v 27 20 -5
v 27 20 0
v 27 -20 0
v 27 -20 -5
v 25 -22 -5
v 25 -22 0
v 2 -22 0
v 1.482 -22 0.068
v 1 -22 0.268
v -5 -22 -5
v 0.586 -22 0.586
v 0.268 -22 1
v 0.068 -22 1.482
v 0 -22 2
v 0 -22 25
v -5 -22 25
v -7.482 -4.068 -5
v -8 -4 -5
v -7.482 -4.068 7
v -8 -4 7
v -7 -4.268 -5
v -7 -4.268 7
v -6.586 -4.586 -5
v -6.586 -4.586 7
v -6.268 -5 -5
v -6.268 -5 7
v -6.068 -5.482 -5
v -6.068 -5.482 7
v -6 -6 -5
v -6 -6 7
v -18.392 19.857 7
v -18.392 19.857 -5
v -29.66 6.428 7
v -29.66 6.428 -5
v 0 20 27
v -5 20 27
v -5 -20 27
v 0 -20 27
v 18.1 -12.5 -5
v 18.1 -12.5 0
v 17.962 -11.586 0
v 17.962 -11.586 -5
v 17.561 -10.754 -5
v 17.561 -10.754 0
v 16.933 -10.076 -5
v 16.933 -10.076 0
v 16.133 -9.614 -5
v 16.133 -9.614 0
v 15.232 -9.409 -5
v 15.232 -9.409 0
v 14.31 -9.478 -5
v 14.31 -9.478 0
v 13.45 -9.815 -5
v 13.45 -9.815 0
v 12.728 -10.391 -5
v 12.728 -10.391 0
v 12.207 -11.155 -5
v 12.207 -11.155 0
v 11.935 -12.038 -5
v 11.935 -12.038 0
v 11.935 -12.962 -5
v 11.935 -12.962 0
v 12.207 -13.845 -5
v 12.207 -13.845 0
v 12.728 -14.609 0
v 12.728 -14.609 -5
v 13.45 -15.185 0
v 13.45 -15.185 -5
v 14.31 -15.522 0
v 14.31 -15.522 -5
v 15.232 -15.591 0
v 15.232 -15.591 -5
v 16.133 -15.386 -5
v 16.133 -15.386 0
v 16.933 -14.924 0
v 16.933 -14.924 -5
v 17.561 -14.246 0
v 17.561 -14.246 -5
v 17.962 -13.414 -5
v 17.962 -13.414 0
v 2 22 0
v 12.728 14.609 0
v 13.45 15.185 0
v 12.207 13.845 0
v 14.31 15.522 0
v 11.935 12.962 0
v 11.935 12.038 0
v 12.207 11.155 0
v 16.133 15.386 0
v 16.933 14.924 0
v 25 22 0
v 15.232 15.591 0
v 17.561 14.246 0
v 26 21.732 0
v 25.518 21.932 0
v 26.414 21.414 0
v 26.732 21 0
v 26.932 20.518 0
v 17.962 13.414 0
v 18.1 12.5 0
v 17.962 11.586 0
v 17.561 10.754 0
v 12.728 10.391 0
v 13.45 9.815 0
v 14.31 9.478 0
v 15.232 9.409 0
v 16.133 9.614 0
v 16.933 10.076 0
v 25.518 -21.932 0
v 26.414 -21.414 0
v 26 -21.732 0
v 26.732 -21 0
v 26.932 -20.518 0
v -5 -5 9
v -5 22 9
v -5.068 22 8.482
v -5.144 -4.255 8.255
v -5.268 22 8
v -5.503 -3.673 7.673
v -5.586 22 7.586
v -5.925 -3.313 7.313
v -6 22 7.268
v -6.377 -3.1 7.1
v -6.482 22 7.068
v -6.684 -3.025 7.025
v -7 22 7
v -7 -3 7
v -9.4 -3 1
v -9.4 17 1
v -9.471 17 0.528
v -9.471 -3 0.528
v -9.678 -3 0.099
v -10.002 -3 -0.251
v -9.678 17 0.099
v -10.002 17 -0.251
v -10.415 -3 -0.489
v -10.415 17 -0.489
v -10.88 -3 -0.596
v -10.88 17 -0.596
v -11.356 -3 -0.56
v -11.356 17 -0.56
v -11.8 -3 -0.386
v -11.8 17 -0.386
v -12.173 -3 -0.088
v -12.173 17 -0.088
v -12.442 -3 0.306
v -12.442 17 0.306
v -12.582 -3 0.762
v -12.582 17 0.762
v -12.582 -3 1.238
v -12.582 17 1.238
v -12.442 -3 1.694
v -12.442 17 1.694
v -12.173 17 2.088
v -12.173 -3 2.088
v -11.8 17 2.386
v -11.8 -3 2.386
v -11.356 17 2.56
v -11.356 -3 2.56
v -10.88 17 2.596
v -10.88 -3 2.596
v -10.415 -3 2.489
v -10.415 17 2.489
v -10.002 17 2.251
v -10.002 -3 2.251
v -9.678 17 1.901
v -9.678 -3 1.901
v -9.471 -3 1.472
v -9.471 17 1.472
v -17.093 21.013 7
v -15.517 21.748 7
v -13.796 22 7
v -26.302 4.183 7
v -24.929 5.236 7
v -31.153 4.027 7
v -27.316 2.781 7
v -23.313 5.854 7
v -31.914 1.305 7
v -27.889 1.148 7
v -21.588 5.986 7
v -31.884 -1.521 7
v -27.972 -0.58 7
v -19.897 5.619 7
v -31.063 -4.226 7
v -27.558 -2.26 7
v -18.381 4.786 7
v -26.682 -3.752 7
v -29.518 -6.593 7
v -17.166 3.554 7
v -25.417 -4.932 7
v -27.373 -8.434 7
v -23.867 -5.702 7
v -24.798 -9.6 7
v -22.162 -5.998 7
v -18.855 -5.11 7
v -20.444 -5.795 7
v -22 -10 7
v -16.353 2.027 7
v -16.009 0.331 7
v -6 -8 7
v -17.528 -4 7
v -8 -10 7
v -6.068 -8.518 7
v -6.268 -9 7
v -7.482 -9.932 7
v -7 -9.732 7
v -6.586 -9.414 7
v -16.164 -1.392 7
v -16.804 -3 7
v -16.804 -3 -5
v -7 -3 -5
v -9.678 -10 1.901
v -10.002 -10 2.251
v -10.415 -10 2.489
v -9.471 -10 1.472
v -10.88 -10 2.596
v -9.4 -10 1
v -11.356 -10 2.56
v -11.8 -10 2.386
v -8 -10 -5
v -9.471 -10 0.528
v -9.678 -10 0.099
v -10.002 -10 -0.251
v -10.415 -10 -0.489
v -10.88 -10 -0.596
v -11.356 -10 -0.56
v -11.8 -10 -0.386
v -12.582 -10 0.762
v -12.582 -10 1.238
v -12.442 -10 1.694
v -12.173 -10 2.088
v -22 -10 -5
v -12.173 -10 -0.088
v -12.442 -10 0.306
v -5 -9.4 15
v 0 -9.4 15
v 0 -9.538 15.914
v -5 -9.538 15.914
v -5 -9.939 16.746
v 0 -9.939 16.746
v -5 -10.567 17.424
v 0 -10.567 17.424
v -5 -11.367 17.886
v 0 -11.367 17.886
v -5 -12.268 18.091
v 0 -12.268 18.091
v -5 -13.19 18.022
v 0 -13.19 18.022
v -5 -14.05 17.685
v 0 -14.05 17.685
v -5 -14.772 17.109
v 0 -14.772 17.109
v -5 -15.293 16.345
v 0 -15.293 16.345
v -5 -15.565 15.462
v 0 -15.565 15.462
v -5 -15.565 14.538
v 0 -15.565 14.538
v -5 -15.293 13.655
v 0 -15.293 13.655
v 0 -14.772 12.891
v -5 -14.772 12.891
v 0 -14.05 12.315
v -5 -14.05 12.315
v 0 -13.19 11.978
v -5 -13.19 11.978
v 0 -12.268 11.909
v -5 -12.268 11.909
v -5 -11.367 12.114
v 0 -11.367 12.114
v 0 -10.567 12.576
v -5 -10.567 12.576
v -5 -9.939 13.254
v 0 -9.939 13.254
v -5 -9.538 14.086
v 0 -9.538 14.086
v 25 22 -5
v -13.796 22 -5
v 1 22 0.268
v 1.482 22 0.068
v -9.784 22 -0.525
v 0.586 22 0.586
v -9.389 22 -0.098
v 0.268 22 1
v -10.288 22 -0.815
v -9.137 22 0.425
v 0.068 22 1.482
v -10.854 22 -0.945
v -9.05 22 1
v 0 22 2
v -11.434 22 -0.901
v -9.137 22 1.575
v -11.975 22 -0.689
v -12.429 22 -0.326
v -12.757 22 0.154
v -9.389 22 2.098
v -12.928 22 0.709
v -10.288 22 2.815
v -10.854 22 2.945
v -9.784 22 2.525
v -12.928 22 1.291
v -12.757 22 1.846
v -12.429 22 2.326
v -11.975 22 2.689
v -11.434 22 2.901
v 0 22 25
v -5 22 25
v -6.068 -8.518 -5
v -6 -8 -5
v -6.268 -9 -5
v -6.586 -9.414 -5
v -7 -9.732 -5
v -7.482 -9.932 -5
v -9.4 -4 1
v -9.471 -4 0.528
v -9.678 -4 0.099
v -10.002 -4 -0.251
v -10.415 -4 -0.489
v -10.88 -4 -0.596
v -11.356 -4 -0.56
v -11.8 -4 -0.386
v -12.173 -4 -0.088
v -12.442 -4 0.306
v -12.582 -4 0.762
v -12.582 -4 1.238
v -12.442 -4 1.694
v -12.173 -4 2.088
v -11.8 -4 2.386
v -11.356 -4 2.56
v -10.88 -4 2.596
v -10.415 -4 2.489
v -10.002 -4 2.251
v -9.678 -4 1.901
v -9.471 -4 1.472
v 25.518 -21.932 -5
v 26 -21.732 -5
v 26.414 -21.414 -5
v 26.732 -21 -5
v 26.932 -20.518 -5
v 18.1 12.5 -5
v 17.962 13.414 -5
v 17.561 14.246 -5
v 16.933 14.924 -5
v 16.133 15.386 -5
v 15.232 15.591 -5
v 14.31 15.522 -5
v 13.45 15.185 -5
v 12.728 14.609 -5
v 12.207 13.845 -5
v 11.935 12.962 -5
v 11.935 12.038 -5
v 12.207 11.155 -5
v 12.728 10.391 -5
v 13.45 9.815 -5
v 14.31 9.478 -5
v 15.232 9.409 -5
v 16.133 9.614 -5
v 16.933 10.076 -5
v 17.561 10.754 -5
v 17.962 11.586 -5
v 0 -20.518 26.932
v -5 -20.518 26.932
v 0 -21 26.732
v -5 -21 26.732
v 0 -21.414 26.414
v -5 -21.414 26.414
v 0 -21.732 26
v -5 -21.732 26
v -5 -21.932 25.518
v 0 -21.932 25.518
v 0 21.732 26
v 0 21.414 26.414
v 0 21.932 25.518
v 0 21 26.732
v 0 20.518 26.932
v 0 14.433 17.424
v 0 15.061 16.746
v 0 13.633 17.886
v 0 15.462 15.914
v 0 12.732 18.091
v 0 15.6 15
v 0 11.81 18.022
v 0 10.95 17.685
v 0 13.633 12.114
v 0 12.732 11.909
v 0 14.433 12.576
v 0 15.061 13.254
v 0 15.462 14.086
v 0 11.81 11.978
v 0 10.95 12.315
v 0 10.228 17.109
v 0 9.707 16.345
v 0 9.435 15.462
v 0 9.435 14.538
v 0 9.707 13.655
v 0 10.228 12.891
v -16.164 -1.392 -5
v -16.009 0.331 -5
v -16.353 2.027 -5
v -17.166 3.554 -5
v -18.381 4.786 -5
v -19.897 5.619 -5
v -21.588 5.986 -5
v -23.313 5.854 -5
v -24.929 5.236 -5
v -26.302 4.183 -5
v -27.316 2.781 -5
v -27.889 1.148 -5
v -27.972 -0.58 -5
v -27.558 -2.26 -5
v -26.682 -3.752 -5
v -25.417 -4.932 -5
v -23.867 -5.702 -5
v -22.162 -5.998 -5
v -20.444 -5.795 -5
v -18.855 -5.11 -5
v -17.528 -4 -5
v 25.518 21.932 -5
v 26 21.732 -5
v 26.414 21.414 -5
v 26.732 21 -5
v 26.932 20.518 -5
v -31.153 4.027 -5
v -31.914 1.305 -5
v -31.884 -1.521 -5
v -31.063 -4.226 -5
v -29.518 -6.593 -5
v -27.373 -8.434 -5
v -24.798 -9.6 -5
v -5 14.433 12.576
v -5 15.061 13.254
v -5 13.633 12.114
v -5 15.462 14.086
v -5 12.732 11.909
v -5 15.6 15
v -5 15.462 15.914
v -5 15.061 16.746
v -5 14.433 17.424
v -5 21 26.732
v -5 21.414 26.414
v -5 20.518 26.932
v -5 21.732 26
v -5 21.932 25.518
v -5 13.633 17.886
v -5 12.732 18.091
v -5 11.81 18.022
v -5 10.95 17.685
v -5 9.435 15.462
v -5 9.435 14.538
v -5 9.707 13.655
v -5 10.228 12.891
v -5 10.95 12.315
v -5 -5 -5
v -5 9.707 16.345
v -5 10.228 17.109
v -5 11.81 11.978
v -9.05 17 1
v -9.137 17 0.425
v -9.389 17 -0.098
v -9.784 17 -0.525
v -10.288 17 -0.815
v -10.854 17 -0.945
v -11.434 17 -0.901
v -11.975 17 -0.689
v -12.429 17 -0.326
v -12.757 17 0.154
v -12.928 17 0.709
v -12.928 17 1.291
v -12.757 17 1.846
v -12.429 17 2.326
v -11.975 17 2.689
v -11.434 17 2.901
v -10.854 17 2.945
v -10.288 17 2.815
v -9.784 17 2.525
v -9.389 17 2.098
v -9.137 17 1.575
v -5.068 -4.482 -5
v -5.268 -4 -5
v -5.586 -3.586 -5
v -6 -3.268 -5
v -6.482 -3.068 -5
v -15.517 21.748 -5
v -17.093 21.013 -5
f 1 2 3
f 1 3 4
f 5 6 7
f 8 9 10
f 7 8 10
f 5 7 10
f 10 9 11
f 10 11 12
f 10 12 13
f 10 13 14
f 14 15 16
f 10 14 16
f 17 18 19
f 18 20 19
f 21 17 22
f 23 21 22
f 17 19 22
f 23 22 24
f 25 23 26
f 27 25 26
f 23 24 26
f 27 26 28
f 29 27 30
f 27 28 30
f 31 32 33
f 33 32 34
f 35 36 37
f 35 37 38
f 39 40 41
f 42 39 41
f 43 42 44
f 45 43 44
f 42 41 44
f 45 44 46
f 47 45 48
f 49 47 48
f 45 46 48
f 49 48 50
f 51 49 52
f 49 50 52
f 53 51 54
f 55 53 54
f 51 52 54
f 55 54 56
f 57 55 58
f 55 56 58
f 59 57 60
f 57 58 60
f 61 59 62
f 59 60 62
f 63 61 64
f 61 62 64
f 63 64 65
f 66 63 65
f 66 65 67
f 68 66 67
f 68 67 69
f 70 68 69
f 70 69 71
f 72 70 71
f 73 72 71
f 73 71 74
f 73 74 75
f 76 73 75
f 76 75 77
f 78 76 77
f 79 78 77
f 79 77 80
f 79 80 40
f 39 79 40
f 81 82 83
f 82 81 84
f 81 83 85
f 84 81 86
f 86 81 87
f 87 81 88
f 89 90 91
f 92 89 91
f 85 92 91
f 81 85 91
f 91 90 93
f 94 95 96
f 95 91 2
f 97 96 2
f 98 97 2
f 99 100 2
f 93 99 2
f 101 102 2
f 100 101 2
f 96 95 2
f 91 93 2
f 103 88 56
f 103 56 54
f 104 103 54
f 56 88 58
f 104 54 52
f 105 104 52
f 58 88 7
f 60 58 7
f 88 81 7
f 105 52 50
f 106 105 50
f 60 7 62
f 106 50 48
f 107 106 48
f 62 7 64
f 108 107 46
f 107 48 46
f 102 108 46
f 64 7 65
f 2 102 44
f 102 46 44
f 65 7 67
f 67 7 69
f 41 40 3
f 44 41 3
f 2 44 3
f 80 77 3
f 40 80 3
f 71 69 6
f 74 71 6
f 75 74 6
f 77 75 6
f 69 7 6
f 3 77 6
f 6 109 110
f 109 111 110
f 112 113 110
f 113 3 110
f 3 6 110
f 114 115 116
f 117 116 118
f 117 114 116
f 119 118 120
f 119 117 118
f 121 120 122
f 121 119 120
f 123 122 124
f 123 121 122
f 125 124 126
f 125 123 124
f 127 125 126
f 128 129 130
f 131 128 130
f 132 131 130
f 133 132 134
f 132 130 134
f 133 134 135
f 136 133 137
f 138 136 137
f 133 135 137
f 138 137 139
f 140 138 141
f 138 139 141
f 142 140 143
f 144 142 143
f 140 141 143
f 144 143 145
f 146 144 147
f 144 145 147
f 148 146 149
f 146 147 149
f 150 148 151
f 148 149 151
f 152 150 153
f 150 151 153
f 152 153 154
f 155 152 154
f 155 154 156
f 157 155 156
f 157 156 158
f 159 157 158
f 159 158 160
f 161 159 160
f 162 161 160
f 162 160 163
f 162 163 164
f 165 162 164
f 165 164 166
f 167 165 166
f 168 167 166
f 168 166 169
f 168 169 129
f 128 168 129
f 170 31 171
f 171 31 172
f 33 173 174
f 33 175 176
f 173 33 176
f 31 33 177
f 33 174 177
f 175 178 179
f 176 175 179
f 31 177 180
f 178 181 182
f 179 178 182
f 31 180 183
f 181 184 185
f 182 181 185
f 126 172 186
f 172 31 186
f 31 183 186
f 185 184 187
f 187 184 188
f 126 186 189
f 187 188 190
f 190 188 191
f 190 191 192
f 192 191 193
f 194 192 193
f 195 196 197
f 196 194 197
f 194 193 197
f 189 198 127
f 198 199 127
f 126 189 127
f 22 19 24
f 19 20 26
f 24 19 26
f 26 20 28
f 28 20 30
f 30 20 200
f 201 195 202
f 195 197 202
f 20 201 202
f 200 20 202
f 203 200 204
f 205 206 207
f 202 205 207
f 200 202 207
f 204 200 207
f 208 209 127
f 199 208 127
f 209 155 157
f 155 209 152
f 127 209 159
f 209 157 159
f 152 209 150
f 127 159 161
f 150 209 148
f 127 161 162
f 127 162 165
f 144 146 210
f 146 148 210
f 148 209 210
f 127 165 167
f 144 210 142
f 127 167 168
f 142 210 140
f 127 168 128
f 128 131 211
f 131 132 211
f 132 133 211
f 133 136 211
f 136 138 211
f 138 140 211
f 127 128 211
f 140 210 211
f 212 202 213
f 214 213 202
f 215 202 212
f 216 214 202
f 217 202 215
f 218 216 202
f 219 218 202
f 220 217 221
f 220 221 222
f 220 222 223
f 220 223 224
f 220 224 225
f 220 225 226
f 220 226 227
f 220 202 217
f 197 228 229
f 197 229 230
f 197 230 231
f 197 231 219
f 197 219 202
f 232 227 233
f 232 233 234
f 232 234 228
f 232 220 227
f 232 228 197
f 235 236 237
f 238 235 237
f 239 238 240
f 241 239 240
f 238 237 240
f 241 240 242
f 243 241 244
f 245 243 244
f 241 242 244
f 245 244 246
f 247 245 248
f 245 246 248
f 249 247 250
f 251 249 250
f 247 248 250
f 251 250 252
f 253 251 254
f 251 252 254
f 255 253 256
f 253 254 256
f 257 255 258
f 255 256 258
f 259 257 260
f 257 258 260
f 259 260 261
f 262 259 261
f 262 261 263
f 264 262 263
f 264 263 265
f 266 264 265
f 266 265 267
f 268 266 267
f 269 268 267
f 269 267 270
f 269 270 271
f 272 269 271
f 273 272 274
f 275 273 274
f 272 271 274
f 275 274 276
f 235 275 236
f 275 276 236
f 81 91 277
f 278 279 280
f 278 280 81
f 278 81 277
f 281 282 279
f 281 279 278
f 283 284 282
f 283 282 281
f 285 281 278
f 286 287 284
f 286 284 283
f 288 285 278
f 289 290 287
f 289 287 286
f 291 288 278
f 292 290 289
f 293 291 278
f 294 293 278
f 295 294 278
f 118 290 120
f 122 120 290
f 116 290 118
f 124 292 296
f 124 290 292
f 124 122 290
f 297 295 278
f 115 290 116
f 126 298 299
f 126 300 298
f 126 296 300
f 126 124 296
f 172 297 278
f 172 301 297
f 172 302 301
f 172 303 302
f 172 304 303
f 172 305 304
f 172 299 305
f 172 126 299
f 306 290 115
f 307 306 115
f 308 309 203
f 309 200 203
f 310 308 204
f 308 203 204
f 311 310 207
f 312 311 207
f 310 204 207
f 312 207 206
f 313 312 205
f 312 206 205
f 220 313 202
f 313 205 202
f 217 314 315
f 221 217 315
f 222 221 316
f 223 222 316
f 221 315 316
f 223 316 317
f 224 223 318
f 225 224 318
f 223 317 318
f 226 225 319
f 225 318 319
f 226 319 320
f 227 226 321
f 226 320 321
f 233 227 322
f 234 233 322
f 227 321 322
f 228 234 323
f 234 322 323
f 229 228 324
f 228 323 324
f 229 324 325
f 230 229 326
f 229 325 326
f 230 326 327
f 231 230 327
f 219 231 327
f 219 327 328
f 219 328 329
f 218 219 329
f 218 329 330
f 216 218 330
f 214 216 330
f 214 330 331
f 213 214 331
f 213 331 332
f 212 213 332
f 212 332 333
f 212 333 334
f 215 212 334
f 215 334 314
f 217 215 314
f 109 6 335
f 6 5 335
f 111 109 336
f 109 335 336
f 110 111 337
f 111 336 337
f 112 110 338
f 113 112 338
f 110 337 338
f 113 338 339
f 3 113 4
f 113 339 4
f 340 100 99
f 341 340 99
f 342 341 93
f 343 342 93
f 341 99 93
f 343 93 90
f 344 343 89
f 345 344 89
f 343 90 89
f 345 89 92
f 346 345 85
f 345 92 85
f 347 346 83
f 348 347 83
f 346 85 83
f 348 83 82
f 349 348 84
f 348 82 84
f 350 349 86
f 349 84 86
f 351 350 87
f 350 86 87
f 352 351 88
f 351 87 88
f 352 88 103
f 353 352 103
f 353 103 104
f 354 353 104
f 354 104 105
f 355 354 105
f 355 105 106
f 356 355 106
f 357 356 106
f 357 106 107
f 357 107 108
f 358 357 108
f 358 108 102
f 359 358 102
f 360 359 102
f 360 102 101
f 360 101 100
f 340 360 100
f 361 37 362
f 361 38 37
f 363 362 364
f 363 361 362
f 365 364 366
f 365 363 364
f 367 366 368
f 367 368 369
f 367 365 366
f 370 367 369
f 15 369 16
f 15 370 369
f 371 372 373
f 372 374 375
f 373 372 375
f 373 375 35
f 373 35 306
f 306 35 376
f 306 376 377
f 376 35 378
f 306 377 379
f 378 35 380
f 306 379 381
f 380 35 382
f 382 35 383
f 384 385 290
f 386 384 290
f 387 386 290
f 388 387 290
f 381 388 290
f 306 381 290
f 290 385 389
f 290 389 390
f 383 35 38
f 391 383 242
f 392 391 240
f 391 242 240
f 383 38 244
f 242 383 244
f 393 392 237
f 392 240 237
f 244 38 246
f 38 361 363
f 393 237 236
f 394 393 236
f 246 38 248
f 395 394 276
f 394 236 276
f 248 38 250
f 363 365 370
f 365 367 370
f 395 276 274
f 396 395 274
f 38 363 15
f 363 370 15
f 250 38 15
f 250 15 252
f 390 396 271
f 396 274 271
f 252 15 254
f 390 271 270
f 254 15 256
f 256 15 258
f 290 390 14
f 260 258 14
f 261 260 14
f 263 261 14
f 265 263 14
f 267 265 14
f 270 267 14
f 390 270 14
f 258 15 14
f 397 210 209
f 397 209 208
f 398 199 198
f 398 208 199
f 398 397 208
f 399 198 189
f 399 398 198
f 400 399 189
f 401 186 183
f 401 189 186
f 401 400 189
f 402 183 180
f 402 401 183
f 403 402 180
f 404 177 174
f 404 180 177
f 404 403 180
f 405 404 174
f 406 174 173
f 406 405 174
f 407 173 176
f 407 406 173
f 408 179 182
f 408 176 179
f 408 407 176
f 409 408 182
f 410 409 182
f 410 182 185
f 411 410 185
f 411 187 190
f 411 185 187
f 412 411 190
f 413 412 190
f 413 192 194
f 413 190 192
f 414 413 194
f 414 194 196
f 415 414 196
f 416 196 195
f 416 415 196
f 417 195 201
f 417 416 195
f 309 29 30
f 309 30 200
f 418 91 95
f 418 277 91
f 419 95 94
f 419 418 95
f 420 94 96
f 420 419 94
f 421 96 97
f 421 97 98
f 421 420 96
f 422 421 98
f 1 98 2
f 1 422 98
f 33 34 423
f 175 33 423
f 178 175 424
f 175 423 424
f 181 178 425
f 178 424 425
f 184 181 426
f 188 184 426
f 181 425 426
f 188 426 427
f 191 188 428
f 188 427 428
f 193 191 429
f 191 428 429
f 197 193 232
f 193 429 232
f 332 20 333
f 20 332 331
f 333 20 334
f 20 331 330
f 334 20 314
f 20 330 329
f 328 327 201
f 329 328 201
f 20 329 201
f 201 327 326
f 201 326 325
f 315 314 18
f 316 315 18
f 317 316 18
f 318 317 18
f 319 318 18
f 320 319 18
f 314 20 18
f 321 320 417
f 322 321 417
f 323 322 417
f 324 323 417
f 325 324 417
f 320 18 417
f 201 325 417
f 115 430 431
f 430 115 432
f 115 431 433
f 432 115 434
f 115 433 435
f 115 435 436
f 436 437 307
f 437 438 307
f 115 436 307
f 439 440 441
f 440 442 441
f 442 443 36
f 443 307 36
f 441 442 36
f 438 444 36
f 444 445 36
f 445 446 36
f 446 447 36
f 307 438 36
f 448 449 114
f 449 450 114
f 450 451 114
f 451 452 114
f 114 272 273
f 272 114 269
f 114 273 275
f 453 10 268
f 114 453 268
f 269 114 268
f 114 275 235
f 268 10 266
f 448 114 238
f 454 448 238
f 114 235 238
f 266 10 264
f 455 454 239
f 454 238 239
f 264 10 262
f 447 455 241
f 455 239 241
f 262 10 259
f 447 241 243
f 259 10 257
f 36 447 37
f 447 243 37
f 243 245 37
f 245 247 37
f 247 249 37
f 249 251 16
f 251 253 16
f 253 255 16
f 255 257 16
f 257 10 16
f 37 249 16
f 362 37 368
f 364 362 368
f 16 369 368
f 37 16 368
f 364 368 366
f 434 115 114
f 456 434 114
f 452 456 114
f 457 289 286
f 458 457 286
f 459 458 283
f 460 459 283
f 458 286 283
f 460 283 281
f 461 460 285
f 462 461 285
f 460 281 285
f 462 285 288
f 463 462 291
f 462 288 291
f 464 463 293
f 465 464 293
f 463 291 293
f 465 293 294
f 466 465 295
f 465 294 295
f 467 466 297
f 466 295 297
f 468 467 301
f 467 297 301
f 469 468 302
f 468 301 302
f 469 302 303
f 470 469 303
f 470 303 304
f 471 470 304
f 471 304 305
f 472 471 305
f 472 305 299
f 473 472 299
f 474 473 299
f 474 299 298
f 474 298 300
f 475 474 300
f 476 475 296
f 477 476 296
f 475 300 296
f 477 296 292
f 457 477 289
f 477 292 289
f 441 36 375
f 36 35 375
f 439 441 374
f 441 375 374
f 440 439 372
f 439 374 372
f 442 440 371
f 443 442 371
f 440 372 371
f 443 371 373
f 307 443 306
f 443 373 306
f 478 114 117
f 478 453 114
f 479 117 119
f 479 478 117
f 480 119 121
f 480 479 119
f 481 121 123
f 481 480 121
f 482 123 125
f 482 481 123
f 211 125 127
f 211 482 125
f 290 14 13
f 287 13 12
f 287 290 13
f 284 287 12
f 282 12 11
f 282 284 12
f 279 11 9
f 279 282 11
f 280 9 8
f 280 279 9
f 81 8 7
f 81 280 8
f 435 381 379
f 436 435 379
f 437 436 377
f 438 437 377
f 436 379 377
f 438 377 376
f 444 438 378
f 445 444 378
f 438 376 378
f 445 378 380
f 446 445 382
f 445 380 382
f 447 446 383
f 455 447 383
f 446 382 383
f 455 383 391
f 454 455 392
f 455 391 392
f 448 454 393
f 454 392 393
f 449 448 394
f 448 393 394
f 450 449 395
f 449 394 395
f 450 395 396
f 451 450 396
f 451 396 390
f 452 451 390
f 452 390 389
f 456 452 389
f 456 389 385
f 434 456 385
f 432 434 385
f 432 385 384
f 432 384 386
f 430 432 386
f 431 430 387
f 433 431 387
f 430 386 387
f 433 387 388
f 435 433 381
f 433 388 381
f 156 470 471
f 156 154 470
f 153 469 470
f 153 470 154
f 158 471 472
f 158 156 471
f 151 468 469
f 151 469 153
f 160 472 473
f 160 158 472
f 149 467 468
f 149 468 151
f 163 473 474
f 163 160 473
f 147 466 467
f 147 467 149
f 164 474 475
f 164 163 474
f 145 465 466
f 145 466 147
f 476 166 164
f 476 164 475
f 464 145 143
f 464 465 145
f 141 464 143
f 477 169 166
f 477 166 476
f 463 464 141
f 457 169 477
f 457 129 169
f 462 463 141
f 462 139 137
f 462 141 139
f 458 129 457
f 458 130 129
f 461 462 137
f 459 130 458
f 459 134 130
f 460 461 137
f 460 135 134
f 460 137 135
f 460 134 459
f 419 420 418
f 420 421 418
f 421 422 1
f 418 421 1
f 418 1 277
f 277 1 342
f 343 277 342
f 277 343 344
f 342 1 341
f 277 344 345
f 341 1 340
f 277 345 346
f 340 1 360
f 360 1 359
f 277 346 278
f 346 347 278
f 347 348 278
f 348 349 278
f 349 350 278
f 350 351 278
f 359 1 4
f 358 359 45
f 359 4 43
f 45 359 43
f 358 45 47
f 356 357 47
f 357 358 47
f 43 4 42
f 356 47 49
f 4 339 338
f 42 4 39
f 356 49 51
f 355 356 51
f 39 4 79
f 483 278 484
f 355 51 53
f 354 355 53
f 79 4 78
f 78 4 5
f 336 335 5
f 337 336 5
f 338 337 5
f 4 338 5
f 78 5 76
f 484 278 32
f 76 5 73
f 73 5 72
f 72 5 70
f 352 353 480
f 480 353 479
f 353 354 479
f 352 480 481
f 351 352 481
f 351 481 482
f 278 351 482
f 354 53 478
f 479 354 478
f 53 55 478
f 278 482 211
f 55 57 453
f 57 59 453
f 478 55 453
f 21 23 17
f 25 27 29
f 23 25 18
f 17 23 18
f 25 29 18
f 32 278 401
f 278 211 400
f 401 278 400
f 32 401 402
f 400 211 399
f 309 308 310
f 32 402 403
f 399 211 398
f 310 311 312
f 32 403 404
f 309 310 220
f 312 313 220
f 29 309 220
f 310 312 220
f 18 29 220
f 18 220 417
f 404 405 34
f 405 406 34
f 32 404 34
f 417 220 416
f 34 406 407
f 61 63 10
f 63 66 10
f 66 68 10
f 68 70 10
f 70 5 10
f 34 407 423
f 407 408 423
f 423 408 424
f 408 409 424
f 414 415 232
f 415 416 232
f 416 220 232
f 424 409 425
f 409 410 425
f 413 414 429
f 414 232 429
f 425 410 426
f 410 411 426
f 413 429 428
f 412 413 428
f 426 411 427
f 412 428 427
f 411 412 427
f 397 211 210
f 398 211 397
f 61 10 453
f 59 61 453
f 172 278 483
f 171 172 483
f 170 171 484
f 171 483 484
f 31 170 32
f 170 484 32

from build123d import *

# Parameters (mm, degrees)
PAD_DEPTH         = 22
SKETCH001_R       = 3.1
POCKET_DEPTH      = 5.001
POCKET_DEPTH_BACK = -27.001
SKETCH002_R       = 3.1
POCKET001_DEPTH   = 5
SKETCH003_R       = 1.6
POCKET002_DEPTH   = 44.001
FILLET_R          = 2
SKETCH004_R       = 1.95
POCKET003_DEPTH   = 5


with BuildPart() as part:
    # Sketch → Pad (new body, symmetric)
    with BuildSketch(Plane.XZ):
        Polygon((0, 27), (0, 0), (27, 0), (27, -5), (-32, -5), (-32, 7), (-5, 7), (-5, 27), align=None)
    extrude(amount=PAD_DEPTH, both=True)

    # Sketch001 → Pocket (cut, two sides)
    with BuildSketch(Plane.XY) as pocket_sk:
        with Locations((15, 12.5)):
            Circle(SKETCH001_R)
        with Locations((15, -12.5)):
            Circle(SKETCH001_R)
        with BuildLine():
            ThreePointArc((-16.803848, -3), (-26.859933, 3.518672), (-17.527864, -4))
            Line((-6, -4), (-17.527864, -4))
            Line((-6, -4), (-6, -10))
            Line((-6, -10), (-22, -10))
            ThreePointArc((-29.660444, 6.427876), (-31.063078, -4.226183), (-22, -10))
            Line((-18.392302, 19.856726), (-29.660444, 6.427876))
            ThreePointArc((-13.796055, 22), (-16.331753, 21.437843), (-18.392302, 19.856726))
            Line((-13.796055, 22), (-13.796055, 28.799225))
            Line((-13.796055, 28.799225), (-40.339119, 28.799225))
            Line((-40.339119, 28.799225), (-40.339119, -28.958258))
            Line((-40.339119, -28.958258), (-5, -28.958258))
            Line((-5, -28.958258), (-5, -3))
            Line((-16.803848, -3), (-5, -3))
        make_face()
    extrude(amount=-POCKET_DEPTH, mode=Mode.SUBTRACT)
    extrude(pocket_sk.sketch, amount=-POCKET_DEPTH_BACK, mode=Mode.SUBTRACT)

    # Sketch002 → Pocket001 (cut)
    with BuildSketch(Plane.YZ):
        with Locations((-12.5, 15)):
            Circle(SKETCH002_R)
        with Locations((12.5, 15)):
            Circle(SKETCH002_R)
    extrude(amount=-POCKET001_DEPTH, mode=Mode.SUBTRACT)

    # Sketch003 (on Face5 of Pocket001) → Pocket002 (cut, through all)
    with BuildSketch(Plane(origin=(0, 22, 0), x_dir=(1, 0, 0), z_dir=(0, 1, 0))):
        with Locations((-11, -1)):
            Circle(SKETCH003_R)
    extrude(amount=-POCKET002_DEPTH, mode=Mode.SUBTRACT)

    # Fillet
    fillet_edges = [part.edges().sort_by_distance(p)[0] for p in [
        (-6, -4, 1),
        (-6, -10, 1),
        (-5, -3, 1),
        (-5, 9.5, 7),
        (27, -22, -2.5),
        (27, 22, -2.5),
        (0, 0, 0),
        (-2.5, -22, 27),
        (-2.5, 22, 27),
    ]]
    fillet(fillet_edges, radius=FILLET_R)

    # Sketch004 (on Face2 of Fillet) → Pocket003 (cut)
    with BuildSketch(Plane(origin=(0, 22, 0), x_dir=(1, 0, 0), z_dir=(0, 1, 0))):
        with Locations((-11, -1)):
            Circle(SKETCH004_R)
    extrude(amount=-POCKET003_DEPTH, mode=Mode.SUBTRACT)


solid = part.part
